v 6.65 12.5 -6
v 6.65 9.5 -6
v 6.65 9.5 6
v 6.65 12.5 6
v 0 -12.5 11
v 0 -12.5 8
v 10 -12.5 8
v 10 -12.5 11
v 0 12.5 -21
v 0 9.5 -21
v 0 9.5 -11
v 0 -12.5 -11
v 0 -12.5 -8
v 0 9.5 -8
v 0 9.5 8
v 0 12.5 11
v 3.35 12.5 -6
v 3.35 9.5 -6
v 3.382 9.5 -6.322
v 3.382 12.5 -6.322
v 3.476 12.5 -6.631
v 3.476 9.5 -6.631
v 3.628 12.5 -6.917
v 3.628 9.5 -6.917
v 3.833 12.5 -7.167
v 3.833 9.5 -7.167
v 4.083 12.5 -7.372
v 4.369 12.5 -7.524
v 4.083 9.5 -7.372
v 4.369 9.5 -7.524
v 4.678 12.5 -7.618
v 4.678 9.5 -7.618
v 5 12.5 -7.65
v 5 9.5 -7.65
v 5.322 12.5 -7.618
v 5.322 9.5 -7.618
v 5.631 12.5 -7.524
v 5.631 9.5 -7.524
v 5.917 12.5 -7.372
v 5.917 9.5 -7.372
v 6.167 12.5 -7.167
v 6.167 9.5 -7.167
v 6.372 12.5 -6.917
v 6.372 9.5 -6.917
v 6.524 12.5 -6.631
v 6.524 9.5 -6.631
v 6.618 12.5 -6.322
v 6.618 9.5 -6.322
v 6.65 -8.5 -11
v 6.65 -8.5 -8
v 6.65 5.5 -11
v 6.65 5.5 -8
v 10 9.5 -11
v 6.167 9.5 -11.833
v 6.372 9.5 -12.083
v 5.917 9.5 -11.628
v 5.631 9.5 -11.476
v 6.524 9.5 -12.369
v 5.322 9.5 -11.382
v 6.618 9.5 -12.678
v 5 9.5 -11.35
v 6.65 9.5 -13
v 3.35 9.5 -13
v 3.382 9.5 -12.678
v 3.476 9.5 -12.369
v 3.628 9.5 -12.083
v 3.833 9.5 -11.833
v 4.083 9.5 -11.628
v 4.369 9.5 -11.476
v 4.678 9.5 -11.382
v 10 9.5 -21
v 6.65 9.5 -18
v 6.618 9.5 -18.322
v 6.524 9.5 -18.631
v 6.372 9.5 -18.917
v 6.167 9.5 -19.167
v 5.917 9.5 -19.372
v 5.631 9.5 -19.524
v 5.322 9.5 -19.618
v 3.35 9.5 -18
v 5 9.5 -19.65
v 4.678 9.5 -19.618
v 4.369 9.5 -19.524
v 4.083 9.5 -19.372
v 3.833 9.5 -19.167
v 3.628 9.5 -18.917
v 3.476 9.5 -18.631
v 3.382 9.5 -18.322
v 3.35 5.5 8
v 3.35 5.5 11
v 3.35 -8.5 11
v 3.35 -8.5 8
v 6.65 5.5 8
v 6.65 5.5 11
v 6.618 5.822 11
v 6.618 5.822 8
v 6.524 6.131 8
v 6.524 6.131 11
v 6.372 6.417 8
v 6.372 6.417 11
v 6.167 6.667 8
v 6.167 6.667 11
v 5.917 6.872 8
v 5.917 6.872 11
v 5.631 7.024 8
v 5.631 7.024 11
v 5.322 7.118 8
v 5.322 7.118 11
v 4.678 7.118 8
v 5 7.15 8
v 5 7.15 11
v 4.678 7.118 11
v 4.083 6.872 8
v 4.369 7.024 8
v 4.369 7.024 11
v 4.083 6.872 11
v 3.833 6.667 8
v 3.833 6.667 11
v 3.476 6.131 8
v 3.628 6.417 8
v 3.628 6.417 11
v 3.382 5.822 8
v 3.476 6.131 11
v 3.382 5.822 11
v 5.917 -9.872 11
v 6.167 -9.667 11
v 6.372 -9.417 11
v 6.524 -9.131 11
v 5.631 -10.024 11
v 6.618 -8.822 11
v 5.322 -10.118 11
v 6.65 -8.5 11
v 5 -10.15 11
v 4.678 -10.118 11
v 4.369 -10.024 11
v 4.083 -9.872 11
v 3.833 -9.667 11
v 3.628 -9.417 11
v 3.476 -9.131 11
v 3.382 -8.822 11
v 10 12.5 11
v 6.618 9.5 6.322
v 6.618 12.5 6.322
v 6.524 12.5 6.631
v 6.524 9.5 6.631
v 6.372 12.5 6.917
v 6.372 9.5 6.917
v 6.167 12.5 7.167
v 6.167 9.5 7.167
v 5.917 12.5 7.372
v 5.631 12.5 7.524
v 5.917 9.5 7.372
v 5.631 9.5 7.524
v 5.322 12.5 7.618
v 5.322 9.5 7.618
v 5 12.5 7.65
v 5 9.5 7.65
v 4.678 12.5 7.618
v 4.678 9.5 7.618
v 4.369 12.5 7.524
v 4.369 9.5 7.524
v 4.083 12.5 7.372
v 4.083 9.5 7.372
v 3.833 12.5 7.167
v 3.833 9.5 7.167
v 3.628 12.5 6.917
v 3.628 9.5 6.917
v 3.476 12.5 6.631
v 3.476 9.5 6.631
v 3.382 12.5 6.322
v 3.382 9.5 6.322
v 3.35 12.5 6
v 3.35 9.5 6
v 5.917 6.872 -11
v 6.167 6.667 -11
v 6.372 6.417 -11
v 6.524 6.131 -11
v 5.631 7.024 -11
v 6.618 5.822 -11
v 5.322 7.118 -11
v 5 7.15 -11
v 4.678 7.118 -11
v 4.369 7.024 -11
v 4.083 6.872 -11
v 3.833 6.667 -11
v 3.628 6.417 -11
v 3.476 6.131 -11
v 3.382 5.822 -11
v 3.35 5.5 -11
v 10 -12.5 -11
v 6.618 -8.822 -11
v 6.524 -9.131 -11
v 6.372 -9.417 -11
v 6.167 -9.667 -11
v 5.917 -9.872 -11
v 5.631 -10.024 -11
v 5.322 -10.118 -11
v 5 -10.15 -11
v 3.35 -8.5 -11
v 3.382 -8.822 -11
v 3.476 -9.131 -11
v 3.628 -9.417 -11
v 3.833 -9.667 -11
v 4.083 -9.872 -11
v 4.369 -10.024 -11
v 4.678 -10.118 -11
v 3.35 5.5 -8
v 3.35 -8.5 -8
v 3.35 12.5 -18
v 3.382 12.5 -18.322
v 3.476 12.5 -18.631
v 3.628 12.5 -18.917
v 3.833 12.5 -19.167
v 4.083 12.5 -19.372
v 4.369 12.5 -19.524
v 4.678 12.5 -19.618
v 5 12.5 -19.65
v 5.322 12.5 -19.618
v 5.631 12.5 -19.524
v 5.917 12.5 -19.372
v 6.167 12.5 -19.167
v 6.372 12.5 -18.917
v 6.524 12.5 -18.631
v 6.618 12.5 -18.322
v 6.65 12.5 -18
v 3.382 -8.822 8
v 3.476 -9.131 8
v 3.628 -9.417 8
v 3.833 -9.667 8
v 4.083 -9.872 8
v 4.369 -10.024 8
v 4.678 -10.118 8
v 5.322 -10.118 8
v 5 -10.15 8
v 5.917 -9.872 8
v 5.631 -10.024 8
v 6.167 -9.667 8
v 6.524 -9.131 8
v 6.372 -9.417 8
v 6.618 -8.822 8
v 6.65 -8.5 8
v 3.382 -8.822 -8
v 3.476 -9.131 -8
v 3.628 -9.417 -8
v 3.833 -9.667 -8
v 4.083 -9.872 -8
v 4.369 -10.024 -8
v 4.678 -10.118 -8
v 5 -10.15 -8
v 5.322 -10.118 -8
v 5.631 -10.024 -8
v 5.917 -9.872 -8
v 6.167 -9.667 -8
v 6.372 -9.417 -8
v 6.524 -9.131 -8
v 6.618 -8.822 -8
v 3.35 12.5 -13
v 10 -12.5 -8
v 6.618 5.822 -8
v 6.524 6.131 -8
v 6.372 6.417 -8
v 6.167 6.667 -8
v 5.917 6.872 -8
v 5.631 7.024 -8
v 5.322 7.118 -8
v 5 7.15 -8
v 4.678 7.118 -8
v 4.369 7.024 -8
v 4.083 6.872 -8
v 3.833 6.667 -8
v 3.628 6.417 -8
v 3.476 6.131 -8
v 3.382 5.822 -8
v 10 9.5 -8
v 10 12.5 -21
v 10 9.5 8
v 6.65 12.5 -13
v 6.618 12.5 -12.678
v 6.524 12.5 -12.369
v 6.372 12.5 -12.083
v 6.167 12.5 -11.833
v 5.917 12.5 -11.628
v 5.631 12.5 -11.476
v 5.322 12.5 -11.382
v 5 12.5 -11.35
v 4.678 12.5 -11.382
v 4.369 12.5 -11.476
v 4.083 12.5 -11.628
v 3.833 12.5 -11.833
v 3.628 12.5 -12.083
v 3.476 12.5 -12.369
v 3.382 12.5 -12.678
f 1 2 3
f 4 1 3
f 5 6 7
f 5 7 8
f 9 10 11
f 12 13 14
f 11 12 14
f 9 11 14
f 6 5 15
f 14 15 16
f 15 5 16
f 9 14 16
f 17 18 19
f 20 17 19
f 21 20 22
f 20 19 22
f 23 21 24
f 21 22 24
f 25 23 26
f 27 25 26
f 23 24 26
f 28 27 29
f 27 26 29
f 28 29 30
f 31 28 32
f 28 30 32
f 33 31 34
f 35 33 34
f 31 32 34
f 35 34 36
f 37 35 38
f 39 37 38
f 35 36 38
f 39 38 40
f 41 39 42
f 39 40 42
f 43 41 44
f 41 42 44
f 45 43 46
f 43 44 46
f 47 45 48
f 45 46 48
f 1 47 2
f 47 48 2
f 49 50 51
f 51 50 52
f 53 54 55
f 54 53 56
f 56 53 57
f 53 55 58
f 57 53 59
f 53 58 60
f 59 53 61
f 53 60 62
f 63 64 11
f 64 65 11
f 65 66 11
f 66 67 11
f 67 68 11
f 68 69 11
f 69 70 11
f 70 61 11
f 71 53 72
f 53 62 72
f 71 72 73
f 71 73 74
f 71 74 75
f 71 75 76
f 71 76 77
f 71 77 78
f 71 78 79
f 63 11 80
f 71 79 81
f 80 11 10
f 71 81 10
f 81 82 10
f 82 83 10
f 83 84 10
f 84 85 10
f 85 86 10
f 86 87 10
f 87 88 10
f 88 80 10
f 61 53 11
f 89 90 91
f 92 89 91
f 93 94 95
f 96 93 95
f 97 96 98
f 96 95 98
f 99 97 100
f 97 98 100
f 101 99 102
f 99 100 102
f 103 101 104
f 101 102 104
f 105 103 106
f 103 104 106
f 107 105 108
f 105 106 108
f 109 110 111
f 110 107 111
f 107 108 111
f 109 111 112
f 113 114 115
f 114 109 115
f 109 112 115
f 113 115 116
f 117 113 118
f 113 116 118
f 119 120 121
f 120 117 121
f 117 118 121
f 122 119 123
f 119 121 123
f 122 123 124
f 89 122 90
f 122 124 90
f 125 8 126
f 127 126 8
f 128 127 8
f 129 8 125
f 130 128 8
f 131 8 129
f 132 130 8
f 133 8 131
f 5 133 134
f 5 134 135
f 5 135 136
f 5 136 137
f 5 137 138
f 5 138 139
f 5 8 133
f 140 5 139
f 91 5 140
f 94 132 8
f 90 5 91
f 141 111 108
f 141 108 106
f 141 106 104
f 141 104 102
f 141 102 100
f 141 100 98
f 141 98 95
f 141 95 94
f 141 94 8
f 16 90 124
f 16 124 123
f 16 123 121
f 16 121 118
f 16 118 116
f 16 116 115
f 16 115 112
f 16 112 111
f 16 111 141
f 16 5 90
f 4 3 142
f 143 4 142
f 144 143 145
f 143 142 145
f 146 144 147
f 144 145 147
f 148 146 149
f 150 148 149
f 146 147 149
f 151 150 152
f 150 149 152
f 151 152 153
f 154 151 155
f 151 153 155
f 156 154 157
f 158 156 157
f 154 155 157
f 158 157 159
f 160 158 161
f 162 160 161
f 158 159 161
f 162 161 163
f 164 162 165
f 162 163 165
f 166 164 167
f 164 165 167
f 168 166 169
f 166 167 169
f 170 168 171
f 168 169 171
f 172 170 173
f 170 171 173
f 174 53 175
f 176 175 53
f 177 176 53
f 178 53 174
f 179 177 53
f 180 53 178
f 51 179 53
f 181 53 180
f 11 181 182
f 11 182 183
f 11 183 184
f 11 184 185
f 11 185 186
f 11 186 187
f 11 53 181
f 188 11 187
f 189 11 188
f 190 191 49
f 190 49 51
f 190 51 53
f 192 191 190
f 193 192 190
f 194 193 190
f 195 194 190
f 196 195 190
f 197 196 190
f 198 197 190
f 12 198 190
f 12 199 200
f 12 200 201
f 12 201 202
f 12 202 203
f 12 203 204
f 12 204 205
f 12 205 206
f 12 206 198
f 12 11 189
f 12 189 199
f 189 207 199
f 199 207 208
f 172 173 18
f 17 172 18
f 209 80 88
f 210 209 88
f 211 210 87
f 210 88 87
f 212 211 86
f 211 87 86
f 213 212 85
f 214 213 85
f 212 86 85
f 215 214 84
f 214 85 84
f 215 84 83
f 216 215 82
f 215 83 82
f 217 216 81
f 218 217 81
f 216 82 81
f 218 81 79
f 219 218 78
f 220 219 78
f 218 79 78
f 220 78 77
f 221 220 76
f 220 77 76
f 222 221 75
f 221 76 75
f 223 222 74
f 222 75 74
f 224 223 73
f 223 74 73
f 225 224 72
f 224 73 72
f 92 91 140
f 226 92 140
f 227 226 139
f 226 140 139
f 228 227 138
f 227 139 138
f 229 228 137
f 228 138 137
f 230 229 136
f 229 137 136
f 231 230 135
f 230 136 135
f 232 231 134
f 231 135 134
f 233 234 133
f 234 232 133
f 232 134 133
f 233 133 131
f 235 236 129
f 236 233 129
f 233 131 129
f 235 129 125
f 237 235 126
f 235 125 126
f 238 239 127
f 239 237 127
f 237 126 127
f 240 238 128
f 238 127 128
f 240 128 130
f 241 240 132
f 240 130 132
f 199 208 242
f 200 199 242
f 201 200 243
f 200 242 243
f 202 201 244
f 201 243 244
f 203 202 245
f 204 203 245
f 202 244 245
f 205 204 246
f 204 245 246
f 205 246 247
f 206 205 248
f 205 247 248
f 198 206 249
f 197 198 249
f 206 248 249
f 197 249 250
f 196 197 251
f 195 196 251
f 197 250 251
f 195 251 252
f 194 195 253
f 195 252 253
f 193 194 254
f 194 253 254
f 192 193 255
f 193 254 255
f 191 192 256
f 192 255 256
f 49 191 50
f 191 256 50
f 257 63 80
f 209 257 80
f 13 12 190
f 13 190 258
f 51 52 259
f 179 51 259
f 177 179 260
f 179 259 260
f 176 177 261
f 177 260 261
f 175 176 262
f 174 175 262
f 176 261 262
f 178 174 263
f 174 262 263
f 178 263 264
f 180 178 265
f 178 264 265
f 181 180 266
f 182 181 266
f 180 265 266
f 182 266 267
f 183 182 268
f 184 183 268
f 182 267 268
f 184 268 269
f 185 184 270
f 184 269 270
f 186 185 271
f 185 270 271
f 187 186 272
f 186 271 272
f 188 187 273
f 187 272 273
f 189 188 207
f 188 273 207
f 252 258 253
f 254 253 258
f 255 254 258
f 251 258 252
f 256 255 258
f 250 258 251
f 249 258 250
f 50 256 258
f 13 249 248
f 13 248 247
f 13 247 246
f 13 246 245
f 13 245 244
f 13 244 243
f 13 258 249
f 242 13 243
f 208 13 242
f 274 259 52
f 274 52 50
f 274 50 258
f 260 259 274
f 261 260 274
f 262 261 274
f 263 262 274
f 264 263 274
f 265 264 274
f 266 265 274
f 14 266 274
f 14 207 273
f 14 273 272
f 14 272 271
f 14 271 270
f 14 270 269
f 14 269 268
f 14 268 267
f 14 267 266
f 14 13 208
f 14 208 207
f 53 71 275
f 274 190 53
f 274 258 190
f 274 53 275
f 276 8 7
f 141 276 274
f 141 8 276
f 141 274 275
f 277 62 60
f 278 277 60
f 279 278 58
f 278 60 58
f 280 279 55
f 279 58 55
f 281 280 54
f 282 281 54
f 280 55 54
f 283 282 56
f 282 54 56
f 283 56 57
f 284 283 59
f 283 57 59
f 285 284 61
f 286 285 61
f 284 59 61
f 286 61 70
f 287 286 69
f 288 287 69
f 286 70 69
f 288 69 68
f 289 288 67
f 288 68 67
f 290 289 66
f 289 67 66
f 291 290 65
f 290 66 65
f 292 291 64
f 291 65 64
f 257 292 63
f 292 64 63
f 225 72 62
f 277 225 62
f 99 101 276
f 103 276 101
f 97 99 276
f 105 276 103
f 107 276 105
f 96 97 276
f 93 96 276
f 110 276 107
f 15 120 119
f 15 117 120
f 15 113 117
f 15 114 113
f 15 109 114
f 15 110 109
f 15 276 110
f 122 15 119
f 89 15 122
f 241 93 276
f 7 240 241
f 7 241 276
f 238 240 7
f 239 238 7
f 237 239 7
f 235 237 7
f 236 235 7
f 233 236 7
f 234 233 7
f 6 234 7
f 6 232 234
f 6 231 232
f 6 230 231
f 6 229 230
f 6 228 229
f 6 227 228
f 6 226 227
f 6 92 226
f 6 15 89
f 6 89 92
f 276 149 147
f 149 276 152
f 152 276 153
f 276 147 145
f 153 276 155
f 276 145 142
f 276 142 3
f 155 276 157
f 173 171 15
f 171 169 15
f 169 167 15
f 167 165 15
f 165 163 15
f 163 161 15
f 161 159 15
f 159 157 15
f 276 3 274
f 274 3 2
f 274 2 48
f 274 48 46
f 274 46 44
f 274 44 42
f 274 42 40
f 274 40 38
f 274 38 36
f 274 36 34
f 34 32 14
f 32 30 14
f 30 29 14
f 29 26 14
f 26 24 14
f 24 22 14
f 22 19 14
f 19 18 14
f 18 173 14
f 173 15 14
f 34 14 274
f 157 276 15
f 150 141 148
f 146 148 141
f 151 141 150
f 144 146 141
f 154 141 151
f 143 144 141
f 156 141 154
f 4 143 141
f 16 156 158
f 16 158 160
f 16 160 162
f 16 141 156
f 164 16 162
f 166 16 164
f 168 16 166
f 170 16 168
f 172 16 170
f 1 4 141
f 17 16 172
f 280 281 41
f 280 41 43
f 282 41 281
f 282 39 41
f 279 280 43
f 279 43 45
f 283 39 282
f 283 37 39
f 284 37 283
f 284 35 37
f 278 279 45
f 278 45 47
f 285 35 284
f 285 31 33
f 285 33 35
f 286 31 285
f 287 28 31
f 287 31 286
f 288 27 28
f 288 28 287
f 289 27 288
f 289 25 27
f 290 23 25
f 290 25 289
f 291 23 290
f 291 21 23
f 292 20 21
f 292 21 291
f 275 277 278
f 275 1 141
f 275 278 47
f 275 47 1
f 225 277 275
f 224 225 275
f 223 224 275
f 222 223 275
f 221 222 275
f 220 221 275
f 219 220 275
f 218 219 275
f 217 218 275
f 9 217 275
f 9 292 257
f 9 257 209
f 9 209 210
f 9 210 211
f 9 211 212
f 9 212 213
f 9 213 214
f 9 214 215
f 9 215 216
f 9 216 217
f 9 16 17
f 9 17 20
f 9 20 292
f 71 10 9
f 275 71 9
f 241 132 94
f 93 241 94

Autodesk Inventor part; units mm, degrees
ref_plane "YZ Plane" through (0, 0, 0) normal (1, 0, 0) x (0, 1, 0)
ref_plane "XZ Plane" through (0, 0, 0) normal (0, 1, 0) x (-1, 0, 0)
ref_plane "XY Plane" through (0, 0, 0) normal (0, 0, 1) x (1, 0, 0)
sketch "Sketch1" plane through (0, 0, 0) normal (1, 0, 0) x (0, 1, 0)
  line L0 (-12.5, 11) -> (12.5, 11)
  line L1 (12.5, 11) -> (12.5, -11)
  line L2 (12.5, -11) -> (-12.5, -11)
  line L3 (-12.5, -11) -> (-12.5, 11)
  line L4 (-12.5, 11) -> (12.5, -11) construction
  line L5 (12.5, 11) -> (-12.5, -11) construction
  line L6 (-9.5, 8) -> (9.5, 8)
  line L7 (9.5, 8) -> (9.5, -8)
  line L8 (9.5, -8) -> (-9.5, -8)
  line L9 (-9.5, -8) -> (-9.5, 8)
  line L10 (-9.5, 8) -> (9.5, -8) construction
  line L11 (9.5, 8) -> (-9.5, -8) construction
  line L12 (-9.5, 8) -> (-12.5, 8)
  line L13 (-12.5, 8) -> (-12.5, -8)
  line L14 (-12.5, -8) -> (-9.5, -8)
  line L15 (-9.5, -8) -> (-9.5, 8)
  line L16 (12.5, -11) -> (9.5, -11)
  line L17 (9.5, -11) -> (9.5, -21)
  line L18 (9.5, -21) -> (12.5, -21)
  line L19 (12.5, -21) -> (12.5, -11)
  point P0 (0, 0)
  point P1 (-12.5, 8)
  point P2 (9.5, -11)
  dimension "d0" = 25
  dimension "d1" = 22
  dimension "d2" = 19
  dimension "d3" = 16
  dimension "d4" = 3
  dimension "d5" = 10
extrude "Extrusion1" add sketch "Sketch1" along normal blind 10 contours L0 L1 L2 L3 L14 L8 L7 L6 L12 | L19 L18 L17 L2
sketch "Sketch2" plane through (0, 9.5, -8) normal (0, -1, 0) x (1, 0, 0)
  line L0 (10, 19) -> (10, 16) projected
  line L1 (0, 0) -> (0, -3) projected
  line L2 (10, 16) -> (0, 16)
  line L3 (0, 16) -> (0, 0)
  line L4 (0, 0) -> (10, 0)
  line L5 (10, 0) -> (10, 16)
  line L6 (5, 16) -> (5, 14)
  line L7 (5, 0) -> (5, 2)
  line L8 (5, 14) -> (5, 2) construction
  line L9 (3.35, 14) -> (3.35, 2)
  line L10 (6.65, 2) -> (6.65, 14)
  arc A0 (6.65, 14) -> (3.35, 14) centre (5, 14) ccw
  arc A1 (3.35, 2) -> (6.65, 2) centre (5, 2) ccw
  line L11 (0, -3) -> (0, -13) projected
  line L12 (10, -13) -> (0, -13)
  line L13 (0, -13) -> (0, -3)
  line L14 (0, -3) -> (10, -3)
  line L15 (10, -3) -> (10, -13)
  line L16 (5, -3) -> (5, -5)
  line L17 (5, -13) -> (5, -10)
  line L18 (5, -5) -> (5, -10) construction
  line L19 (3.35, -5) -> (3.35, -10)
  line L20 (6.65, -10) -> (6.65, -5)
  arc A2 (6.65, -5) -> (3.35, -5) centre (5, -5) ccw
  arc A3 (3.35, -10) -> (6.65, -10) centre (5, -10) ccw
  point P0 (0, 8)
  point P1 (5, 8)
  point P2 (5, -7.5)
  dimension "d8" = 2
  dimension "d9" = 2
  dimension "d10" = 3.3
  dimension "d11" = 2
  dimension "d12" = 3
  dimension "d13" = 3.3
extrude "Extrusion2" cut sketch "Sketch2" against normal through all contours A1 L9 A0 L10 | A2 L20 A3 L19
sketch "Sketch3" plane through (0, -12.5, 11) normal (0, 0, 1) x (1, 0, 0)
  line L0 (0, 0) -> (10, 0) projected
  line L1 (0, 22) -> (10, 22) projected
  line L2 (0, 0) -> (10, 0)
  line L3 (10, 0) -> (10, 22)
  line L4 (10, 22) -> (0, 22)
  line L5 (0, 22) -> (0, 0)
  line L6 (5, 22) -> (5, 18)
  line L7 (5, 0) -> (5, 4)
  line L8 (5, 18) -> (5, 4) construction
  line L9 (3.35, 18) -> (3.35, 4)
  line L10 (6.65, 4) -> (6.65, 18)
  arc A0 (6.65, 18) -> (3.35, 18) centre (5, 18) ccw
  arc A1 (3.35, 4) -> (6.65, 4) centre (5, 4) ccw
  point P0 (0, 12.5)
  point P1 (5, 11)
  dimension "d16" = 4
  dimension "d17" = 4
  dimension "d18" = 3.3
extrude "Extrusion3" cut sketch "Sketch3" against normal through all contours A1 L9 A0 L10
properties part number "BeltMount1"
